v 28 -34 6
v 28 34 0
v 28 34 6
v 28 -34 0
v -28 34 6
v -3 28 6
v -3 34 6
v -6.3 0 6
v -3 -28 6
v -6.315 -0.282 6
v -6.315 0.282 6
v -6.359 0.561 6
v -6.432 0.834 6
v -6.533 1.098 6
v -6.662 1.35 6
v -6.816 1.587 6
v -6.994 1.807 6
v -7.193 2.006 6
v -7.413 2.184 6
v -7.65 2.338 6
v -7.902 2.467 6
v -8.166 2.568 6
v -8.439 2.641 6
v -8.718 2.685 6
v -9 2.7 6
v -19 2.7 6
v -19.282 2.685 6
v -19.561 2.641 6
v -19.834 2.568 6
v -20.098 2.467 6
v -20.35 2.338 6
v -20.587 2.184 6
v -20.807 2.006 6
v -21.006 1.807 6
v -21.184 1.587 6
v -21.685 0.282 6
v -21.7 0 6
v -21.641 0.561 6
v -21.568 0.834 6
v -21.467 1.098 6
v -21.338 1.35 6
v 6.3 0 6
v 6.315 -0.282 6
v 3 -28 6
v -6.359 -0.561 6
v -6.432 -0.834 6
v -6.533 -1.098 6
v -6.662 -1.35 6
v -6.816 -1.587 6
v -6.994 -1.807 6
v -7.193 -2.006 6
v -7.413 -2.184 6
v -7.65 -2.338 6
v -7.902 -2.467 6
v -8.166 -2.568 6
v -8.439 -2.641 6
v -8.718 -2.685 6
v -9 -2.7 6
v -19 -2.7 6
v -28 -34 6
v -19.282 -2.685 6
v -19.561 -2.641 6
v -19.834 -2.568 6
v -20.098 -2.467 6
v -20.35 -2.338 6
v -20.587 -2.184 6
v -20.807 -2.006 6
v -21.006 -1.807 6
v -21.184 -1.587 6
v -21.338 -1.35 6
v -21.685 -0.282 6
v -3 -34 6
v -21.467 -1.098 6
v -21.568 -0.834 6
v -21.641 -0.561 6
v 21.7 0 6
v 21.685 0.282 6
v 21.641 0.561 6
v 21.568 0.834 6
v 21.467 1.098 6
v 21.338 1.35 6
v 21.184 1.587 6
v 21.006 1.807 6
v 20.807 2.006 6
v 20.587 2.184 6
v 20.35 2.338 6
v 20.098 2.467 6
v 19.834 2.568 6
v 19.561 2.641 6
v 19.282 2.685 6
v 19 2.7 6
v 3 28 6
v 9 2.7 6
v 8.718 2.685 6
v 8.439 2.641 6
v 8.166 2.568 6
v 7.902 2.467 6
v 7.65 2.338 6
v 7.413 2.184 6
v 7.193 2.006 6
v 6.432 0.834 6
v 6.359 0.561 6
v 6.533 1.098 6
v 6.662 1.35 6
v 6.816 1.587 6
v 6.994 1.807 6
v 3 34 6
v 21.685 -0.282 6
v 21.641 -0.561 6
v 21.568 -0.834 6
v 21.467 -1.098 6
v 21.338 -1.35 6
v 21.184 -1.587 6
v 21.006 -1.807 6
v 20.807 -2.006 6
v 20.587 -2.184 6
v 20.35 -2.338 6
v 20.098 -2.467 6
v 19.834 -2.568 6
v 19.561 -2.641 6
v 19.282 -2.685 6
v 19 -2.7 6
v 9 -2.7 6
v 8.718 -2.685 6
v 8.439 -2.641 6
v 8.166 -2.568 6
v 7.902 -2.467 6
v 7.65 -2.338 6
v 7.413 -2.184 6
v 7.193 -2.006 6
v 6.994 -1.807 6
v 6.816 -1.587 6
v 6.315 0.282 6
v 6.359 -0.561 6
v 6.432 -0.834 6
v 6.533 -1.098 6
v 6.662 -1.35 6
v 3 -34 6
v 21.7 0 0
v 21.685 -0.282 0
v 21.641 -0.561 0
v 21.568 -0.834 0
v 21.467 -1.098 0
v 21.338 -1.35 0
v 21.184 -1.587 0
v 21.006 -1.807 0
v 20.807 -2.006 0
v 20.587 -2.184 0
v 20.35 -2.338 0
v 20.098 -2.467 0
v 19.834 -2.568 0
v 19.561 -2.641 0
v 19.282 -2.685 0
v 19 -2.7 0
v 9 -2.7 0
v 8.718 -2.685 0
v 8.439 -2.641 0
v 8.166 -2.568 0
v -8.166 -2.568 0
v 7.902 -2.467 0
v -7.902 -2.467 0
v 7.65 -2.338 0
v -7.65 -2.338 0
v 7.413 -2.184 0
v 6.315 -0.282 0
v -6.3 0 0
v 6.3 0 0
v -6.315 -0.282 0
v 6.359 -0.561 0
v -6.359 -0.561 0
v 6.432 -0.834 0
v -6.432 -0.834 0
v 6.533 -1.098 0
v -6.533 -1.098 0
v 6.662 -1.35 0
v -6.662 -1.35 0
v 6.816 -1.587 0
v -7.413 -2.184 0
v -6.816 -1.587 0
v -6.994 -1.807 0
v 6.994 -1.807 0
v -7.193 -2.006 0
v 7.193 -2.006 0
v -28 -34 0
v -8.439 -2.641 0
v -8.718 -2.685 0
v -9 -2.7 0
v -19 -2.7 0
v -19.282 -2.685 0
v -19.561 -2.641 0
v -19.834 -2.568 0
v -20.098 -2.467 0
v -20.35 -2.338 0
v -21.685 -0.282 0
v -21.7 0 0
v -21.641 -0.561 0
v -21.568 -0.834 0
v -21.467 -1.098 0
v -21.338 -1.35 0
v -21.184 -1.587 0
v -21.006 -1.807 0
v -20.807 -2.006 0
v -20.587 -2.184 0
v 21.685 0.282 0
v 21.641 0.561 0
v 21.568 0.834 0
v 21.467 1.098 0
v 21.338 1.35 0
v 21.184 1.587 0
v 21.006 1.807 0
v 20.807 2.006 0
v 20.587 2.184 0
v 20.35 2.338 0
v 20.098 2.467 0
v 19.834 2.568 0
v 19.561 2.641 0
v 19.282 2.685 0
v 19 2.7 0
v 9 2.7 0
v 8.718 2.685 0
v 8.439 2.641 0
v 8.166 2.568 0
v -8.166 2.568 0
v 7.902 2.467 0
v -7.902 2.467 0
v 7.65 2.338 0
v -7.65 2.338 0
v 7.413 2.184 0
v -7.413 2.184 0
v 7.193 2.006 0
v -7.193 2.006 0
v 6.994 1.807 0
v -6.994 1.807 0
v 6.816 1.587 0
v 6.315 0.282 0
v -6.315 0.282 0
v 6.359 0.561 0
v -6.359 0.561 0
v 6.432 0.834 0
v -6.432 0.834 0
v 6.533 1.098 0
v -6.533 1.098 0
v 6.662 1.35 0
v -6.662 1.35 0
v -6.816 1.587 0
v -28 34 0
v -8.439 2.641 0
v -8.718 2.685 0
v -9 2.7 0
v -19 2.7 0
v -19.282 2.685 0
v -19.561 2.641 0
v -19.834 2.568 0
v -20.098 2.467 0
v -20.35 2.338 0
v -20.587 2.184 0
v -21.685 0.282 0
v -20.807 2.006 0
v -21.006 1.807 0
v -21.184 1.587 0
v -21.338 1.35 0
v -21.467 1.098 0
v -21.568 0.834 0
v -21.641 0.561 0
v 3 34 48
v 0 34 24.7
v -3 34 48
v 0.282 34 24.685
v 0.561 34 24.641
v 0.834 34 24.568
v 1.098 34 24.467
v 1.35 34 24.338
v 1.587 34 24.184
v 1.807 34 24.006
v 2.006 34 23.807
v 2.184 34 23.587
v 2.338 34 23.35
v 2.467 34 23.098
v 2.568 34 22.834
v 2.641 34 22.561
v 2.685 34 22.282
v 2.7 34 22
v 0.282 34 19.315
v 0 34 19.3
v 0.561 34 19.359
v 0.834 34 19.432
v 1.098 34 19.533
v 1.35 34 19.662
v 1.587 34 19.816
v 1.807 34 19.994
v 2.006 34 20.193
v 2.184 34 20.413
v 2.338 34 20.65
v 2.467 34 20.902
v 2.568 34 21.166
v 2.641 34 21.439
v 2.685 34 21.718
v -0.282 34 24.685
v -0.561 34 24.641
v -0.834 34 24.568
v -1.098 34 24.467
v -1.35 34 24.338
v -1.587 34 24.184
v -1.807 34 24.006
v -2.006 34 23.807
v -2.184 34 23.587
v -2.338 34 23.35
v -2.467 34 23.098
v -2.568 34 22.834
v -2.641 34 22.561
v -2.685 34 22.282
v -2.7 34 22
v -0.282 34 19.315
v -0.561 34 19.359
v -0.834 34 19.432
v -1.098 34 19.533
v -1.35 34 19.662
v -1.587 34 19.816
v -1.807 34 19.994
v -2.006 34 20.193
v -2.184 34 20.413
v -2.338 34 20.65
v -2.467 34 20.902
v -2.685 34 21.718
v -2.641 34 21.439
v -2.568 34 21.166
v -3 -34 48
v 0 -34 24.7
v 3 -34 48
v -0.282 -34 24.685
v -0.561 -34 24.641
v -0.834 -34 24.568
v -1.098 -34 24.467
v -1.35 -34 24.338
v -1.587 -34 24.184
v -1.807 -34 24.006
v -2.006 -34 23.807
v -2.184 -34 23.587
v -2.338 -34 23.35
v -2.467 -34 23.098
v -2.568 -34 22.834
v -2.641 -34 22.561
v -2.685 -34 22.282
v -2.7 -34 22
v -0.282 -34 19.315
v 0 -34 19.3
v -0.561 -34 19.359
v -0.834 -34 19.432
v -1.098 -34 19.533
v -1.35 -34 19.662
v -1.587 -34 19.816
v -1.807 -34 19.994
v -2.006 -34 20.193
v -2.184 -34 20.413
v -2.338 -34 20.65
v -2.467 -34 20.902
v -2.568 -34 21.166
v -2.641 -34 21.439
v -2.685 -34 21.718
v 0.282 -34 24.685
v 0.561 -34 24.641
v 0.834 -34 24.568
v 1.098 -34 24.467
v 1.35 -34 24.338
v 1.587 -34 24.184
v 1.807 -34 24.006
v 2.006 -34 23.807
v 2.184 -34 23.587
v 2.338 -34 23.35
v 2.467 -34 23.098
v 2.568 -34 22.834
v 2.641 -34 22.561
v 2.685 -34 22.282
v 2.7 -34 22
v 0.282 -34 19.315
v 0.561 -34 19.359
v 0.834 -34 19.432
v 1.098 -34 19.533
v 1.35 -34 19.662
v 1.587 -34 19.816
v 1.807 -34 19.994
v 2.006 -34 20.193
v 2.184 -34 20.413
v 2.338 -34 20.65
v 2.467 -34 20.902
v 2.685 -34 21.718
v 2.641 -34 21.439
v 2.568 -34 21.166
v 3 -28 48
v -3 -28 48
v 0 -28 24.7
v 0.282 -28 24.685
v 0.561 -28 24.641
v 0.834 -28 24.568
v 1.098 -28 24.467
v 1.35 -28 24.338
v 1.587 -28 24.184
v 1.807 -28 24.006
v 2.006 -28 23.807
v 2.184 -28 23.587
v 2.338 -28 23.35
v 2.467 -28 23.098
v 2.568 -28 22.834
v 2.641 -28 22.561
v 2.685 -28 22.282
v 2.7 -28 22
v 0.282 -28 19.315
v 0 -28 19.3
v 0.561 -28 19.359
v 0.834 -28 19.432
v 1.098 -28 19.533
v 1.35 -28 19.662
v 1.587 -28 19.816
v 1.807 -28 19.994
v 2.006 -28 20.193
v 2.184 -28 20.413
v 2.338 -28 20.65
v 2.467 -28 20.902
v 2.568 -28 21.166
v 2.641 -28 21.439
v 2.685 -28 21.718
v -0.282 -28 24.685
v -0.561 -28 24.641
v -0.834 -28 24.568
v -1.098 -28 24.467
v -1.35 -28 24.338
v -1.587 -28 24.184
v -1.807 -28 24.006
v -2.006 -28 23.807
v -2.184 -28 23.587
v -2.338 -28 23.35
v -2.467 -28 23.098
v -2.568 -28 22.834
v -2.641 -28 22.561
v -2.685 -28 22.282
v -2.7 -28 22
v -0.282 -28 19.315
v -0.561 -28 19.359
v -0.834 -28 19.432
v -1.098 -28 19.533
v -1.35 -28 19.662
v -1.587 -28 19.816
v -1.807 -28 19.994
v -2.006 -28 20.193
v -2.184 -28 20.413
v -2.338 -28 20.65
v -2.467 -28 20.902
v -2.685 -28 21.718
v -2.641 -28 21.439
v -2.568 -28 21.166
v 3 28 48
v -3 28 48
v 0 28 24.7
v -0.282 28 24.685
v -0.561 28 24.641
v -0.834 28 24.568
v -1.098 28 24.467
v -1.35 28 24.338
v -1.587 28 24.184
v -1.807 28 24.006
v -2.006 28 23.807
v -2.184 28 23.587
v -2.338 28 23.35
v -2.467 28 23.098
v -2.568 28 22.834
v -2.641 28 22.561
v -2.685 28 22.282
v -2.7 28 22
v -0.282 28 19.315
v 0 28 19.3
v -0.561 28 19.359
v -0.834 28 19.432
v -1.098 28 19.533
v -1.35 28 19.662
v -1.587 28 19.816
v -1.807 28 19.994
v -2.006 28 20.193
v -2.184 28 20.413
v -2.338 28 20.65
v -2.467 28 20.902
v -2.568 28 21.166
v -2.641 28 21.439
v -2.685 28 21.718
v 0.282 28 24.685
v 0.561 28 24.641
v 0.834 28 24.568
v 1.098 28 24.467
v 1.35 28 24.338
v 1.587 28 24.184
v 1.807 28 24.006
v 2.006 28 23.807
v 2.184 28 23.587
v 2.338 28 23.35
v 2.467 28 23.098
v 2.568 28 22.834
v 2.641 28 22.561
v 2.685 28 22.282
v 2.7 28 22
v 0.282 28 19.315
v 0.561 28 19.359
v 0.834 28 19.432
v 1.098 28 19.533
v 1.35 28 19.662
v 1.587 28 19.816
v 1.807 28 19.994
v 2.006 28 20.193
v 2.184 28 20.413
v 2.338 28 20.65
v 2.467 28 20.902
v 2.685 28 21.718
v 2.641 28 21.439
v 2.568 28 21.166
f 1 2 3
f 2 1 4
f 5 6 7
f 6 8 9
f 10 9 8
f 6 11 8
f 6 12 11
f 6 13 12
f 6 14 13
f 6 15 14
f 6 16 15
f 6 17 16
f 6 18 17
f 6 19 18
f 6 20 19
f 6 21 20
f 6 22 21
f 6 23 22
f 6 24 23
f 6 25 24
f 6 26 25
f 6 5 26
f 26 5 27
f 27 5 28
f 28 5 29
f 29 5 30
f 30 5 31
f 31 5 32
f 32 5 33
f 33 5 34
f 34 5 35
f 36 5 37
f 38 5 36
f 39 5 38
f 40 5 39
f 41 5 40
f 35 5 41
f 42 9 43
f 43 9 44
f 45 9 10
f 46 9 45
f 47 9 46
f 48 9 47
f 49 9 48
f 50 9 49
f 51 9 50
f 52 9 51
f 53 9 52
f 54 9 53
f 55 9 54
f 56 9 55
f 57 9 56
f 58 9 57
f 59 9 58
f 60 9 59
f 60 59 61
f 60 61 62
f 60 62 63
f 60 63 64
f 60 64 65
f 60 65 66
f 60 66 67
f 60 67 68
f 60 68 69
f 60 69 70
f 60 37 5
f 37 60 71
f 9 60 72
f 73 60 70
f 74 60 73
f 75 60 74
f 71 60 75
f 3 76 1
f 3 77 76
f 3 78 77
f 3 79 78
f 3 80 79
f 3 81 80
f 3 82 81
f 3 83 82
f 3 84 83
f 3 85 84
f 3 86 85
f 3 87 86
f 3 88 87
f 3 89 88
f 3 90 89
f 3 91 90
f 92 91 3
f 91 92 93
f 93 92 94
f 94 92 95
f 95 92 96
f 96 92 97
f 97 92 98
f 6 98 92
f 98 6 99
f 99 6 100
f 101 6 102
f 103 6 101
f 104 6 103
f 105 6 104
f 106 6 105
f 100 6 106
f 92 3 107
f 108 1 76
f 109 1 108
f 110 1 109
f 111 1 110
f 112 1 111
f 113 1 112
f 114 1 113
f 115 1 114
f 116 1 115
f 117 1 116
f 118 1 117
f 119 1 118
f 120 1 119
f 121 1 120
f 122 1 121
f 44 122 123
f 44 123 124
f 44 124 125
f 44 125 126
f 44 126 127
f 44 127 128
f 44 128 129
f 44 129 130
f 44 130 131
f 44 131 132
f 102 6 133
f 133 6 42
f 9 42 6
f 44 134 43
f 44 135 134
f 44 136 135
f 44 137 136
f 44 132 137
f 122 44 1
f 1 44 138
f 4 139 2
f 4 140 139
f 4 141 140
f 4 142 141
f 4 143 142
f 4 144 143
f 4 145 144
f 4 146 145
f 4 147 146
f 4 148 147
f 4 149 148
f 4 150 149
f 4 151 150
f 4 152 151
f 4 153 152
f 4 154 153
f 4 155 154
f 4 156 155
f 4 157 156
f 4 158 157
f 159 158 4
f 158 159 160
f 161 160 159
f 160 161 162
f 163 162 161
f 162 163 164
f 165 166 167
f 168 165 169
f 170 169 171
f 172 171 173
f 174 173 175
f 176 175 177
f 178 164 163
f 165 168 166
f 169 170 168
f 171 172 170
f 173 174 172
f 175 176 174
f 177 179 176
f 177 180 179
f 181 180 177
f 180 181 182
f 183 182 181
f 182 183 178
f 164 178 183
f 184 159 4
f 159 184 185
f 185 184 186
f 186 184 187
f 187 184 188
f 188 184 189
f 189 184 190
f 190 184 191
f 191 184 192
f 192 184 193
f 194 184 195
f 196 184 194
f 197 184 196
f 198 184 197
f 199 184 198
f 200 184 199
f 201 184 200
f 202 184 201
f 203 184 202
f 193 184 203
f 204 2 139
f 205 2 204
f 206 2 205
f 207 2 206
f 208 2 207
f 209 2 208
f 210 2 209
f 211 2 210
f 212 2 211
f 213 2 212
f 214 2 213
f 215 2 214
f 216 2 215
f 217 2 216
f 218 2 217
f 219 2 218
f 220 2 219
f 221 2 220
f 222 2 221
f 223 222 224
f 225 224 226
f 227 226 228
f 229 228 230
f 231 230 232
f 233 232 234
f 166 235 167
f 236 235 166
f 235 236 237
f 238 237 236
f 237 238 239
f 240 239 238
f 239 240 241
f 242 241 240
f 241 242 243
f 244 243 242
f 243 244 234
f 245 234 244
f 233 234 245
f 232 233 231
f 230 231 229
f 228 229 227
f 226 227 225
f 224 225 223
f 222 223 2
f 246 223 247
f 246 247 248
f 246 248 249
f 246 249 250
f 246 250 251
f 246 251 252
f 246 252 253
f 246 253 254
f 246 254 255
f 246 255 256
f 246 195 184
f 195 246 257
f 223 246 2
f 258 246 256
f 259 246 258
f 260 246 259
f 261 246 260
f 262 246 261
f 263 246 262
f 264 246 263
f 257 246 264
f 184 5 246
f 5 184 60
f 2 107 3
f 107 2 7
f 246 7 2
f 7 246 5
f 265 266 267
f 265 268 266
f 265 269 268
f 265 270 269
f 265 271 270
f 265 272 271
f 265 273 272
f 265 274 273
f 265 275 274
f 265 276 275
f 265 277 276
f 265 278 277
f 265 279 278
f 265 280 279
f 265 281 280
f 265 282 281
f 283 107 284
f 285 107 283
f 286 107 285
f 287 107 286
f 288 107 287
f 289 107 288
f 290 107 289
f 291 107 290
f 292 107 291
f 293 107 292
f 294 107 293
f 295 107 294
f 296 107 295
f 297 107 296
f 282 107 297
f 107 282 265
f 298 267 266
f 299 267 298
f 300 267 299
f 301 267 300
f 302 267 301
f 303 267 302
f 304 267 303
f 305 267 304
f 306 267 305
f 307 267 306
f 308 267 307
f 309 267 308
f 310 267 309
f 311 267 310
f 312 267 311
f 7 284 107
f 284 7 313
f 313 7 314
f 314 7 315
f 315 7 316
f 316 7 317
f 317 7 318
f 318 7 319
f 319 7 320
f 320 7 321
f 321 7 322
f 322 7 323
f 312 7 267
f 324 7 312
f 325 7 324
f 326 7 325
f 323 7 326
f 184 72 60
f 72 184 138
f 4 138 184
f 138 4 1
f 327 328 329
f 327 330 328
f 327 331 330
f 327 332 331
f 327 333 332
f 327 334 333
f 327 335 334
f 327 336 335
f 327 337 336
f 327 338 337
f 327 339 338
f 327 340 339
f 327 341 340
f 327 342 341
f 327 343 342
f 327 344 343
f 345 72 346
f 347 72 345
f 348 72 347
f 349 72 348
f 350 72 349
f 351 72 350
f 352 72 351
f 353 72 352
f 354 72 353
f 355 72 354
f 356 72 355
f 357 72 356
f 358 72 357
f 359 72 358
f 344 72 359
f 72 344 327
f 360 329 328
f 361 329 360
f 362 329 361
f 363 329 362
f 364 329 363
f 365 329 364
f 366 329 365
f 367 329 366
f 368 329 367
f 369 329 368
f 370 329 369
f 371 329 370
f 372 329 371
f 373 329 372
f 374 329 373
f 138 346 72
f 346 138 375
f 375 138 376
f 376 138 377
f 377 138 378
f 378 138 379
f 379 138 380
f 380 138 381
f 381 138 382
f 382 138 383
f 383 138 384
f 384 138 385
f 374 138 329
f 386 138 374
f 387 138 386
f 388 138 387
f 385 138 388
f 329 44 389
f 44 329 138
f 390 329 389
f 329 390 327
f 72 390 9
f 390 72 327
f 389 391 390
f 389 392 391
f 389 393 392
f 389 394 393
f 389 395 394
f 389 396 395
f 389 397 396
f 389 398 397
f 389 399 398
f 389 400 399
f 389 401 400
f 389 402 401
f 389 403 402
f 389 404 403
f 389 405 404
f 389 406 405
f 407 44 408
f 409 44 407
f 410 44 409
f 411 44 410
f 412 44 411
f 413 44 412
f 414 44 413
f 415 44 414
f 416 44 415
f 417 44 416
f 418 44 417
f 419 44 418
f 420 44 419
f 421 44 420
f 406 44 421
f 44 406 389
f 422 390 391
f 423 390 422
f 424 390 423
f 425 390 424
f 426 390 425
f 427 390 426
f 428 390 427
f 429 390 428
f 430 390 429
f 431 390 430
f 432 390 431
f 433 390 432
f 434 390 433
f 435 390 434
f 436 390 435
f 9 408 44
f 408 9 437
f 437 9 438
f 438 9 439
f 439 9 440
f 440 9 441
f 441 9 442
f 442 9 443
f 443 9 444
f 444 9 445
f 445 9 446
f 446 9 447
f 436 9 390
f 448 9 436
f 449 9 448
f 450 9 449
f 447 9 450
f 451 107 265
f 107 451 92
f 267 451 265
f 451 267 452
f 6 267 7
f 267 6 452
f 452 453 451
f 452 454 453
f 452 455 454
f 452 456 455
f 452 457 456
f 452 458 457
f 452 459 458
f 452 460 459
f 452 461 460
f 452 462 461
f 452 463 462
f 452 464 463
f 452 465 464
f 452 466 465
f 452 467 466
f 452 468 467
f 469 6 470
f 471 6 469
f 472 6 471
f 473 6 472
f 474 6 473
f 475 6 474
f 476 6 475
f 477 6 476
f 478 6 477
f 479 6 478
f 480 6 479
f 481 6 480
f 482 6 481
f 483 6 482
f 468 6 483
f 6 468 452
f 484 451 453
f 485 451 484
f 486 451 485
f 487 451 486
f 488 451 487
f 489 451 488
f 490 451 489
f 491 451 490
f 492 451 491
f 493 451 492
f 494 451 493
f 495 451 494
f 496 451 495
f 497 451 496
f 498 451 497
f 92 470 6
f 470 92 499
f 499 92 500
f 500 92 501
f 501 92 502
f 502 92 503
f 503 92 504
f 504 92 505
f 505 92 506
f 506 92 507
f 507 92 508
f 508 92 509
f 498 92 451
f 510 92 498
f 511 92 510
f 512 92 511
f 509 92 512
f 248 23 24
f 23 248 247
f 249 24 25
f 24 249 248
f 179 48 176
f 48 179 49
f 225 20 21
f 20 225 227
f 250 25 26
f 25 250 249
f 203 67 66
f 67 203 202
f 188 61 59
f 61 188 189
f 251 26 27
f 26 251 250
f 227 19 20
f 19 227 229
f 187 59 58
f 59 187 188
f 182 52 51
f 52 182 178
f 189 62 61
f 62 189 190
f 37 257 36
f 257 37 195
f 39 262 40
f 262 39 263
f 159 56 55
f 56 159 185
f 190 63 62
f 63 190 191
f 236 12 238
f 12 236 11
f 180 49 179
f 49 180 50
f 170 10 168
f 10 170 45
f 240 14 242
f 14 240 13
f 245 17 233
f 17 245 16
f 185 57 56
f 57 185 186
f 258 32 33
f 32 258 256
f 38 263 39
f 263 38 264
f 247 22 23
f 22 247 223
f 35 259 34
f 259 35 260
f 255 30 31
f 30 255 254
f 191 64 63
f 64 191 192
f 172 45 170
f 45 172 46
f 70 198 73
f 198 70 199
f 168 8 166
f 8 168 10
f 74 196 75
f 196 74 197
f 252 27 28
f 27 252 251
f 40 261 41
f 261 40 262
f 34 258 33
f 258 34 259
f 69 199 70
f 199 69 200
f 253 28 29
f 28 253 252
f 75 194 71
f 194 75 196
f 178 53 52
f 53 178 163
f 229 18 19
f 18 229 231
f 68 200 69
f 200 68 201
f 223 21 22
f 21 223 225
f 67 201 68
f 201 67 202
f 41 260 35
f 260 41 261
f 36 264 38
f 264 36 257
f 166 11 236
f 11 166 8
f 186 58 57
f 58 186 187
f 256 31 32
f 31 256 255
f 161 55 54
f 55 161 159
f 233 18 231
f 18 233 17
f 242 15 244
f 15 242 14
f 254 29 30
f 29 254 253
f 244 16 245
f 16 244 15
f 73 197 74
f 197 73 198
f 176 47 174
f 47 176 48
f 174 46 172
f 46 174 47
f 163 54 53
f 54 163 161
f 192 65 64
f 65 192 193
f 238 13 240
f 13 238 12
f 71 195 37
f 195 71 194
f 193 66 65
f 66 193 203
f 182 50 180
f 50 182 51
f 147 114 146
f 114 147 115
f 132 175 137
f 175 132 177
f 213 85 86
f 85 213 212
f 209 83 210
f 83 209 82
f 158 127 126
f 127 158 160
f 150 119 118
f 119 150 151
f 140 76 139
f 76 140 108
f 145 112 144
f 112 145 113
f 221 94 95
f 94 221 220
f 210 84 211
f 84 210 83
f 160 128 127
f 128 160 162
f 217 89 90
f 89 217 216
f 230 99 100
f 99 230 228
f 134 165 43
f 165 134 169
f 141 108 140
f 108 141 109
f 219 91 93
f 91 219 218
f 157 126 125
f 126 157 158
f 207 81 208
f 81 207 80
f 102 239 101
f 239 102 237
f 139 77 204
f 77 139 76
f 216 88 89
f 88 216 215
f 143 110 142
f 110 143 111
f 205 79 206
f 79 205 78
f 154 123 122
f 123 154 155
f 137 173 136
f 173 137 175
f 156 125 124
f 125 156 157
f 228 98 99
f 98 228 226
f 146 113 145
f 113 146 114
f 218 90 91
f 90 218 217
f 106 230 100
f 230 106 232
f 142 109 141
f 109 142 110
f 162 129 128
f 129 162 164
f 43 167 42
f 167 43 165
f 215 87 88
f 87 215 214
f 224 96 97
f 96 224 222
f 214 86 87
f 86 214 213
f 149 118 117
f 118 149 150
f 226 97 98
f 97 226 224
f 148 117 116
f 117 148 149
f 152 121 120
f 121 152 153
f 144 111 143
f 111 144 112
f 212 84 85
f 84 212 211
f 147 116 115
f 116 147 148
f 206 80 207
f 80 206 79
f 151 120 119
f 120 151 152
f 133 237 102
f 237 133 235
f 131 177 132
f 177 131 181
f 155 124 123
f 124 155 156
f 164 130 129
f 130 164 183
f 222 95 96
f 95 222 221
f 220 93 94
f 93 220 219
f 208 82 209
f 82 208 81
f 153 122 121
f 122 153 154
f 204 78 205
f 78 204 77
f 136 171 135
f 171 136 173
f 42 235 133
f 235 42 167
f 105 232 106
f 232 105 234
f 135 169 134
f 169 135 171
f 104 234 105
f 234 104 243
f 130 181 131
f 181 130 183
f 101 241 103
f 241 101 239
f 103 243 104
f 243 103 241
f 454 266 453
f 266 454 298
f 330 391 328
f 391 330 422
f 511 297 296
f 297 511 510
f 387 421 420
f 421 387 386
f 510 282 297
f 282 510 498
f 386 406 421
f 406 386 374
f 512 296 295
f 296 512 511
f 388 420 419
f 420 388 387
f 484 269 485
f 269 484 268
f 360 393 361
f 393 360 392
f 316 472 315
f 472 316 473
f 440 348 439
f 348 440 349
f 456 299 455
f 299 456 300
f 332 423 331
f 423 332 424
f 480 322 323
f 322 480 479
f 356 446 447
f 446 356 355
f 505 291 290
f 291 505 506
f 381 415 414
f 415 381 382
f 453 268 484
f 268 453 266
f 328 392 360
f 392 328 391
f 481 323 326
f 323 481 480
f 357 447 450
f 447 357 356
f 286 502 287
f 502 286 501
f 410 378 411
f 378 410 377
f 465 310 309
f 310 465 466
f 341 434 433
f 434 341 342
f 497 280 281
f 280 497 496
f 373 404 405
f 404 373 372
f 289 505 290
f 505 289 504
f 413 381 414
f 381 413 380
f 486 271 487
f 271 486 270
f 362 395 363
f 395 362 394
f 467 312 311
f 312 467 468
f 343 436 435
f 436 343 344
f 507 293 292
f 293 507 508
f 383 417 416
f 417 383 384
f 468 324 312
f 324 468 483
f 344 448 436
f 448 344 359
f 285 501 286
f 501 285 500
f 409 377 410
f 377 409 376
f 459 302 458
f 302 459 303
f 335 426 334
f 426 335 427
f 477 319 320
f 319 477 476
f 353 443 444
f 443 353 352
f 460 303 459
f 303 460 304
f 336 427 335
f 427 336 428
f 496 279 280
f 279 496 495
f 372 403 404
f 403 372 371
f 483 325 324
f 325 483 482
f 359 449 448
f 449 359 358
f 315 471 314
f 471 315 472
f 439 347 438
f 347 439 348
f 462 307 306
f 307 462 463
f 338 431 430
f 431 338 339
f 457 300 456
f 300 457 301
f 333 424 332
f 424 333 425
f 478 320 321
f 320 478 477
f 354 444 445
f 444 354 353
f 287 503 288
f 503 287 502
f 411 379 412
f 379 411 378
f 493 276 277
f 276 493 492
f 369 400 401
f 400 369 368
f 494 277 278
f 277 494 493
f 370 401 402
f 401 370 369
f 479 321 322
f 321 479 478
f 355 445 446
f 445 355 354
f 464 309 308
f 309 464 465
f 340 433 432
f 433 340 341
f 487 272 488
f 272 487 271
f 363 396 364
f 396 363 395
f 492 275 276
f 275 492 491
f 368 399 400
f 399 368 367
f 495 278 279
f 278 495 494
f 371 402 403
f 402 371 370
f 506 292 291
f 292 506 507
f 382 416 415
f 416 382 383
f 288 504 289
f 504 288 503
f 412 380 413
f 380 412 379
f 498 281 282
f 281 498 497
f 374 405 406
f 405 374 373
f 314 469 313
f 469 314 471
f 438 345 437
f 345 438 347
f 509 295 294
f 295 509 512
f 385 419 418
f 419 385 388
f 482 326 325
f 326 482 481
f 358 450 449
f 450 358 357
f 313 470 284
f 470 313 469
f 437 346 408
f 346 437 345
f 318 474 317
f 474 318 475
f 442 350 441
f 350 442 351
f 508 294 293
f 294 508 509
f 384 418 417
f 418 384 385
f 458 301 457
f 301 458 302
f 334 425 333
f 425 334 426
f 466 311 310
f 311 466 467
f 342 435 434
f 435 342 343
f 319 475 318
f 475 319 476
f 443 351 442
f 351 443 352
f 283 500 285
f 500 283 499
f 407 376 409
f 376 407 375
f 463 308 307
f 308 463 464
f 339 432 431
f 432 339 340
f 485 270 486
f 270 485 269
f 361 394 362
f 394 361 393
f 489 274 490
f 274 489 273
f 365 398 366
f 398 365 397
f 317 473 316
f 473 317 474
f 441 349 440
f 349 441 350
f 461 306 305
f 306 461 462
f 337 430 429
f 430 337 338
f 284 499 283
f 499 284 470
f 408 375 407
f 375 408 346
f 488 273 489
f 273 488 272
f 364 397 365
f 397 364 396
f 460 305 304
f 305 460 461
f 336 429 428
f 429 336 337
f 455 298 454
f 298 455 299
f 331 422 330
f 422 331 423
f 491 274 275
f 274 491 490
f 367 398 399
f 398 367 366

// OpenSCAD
// U pivot bracket, 56 mm opening.
$fn = 60;
eps = 0.02;
base_l = 56;
base_w = 68;
base_t = 6;
ear_t = 6;
ear_h = 44;
pivot_d = 5.4;
module mount(x) {
    hull() {
        translate([x - 5, 0, -eps]) cylinder(d = 5.4, h = base_t + 2 * eps);
        translate([x + 5, 0, -eps]) cylinder(d = 5.4, h = base_t + 2 * eps);
    }
}
difference() {
    union() {
        translate([-base_l / 2, -base_w / 2, 0]) cube([base_l, base_w, base_t]);
        translate([-ear_t / 2, -base_w / 2, base_t - 2]) cube([ear_t, ear_t, ear_h]);
        translate([-ear_t / 2, base_w / 2 - ear_t, base_t - 2]) cube([ear_t, ear_t, ear_h]);
    }
    mount(-14); mount(14);
    translate([0, -base_w / 2 - eps, ear_h / 2]) rotate([-90, 0, 0]) cylinder(d = pivot_d, h = base_w + 2 * eps);
}
